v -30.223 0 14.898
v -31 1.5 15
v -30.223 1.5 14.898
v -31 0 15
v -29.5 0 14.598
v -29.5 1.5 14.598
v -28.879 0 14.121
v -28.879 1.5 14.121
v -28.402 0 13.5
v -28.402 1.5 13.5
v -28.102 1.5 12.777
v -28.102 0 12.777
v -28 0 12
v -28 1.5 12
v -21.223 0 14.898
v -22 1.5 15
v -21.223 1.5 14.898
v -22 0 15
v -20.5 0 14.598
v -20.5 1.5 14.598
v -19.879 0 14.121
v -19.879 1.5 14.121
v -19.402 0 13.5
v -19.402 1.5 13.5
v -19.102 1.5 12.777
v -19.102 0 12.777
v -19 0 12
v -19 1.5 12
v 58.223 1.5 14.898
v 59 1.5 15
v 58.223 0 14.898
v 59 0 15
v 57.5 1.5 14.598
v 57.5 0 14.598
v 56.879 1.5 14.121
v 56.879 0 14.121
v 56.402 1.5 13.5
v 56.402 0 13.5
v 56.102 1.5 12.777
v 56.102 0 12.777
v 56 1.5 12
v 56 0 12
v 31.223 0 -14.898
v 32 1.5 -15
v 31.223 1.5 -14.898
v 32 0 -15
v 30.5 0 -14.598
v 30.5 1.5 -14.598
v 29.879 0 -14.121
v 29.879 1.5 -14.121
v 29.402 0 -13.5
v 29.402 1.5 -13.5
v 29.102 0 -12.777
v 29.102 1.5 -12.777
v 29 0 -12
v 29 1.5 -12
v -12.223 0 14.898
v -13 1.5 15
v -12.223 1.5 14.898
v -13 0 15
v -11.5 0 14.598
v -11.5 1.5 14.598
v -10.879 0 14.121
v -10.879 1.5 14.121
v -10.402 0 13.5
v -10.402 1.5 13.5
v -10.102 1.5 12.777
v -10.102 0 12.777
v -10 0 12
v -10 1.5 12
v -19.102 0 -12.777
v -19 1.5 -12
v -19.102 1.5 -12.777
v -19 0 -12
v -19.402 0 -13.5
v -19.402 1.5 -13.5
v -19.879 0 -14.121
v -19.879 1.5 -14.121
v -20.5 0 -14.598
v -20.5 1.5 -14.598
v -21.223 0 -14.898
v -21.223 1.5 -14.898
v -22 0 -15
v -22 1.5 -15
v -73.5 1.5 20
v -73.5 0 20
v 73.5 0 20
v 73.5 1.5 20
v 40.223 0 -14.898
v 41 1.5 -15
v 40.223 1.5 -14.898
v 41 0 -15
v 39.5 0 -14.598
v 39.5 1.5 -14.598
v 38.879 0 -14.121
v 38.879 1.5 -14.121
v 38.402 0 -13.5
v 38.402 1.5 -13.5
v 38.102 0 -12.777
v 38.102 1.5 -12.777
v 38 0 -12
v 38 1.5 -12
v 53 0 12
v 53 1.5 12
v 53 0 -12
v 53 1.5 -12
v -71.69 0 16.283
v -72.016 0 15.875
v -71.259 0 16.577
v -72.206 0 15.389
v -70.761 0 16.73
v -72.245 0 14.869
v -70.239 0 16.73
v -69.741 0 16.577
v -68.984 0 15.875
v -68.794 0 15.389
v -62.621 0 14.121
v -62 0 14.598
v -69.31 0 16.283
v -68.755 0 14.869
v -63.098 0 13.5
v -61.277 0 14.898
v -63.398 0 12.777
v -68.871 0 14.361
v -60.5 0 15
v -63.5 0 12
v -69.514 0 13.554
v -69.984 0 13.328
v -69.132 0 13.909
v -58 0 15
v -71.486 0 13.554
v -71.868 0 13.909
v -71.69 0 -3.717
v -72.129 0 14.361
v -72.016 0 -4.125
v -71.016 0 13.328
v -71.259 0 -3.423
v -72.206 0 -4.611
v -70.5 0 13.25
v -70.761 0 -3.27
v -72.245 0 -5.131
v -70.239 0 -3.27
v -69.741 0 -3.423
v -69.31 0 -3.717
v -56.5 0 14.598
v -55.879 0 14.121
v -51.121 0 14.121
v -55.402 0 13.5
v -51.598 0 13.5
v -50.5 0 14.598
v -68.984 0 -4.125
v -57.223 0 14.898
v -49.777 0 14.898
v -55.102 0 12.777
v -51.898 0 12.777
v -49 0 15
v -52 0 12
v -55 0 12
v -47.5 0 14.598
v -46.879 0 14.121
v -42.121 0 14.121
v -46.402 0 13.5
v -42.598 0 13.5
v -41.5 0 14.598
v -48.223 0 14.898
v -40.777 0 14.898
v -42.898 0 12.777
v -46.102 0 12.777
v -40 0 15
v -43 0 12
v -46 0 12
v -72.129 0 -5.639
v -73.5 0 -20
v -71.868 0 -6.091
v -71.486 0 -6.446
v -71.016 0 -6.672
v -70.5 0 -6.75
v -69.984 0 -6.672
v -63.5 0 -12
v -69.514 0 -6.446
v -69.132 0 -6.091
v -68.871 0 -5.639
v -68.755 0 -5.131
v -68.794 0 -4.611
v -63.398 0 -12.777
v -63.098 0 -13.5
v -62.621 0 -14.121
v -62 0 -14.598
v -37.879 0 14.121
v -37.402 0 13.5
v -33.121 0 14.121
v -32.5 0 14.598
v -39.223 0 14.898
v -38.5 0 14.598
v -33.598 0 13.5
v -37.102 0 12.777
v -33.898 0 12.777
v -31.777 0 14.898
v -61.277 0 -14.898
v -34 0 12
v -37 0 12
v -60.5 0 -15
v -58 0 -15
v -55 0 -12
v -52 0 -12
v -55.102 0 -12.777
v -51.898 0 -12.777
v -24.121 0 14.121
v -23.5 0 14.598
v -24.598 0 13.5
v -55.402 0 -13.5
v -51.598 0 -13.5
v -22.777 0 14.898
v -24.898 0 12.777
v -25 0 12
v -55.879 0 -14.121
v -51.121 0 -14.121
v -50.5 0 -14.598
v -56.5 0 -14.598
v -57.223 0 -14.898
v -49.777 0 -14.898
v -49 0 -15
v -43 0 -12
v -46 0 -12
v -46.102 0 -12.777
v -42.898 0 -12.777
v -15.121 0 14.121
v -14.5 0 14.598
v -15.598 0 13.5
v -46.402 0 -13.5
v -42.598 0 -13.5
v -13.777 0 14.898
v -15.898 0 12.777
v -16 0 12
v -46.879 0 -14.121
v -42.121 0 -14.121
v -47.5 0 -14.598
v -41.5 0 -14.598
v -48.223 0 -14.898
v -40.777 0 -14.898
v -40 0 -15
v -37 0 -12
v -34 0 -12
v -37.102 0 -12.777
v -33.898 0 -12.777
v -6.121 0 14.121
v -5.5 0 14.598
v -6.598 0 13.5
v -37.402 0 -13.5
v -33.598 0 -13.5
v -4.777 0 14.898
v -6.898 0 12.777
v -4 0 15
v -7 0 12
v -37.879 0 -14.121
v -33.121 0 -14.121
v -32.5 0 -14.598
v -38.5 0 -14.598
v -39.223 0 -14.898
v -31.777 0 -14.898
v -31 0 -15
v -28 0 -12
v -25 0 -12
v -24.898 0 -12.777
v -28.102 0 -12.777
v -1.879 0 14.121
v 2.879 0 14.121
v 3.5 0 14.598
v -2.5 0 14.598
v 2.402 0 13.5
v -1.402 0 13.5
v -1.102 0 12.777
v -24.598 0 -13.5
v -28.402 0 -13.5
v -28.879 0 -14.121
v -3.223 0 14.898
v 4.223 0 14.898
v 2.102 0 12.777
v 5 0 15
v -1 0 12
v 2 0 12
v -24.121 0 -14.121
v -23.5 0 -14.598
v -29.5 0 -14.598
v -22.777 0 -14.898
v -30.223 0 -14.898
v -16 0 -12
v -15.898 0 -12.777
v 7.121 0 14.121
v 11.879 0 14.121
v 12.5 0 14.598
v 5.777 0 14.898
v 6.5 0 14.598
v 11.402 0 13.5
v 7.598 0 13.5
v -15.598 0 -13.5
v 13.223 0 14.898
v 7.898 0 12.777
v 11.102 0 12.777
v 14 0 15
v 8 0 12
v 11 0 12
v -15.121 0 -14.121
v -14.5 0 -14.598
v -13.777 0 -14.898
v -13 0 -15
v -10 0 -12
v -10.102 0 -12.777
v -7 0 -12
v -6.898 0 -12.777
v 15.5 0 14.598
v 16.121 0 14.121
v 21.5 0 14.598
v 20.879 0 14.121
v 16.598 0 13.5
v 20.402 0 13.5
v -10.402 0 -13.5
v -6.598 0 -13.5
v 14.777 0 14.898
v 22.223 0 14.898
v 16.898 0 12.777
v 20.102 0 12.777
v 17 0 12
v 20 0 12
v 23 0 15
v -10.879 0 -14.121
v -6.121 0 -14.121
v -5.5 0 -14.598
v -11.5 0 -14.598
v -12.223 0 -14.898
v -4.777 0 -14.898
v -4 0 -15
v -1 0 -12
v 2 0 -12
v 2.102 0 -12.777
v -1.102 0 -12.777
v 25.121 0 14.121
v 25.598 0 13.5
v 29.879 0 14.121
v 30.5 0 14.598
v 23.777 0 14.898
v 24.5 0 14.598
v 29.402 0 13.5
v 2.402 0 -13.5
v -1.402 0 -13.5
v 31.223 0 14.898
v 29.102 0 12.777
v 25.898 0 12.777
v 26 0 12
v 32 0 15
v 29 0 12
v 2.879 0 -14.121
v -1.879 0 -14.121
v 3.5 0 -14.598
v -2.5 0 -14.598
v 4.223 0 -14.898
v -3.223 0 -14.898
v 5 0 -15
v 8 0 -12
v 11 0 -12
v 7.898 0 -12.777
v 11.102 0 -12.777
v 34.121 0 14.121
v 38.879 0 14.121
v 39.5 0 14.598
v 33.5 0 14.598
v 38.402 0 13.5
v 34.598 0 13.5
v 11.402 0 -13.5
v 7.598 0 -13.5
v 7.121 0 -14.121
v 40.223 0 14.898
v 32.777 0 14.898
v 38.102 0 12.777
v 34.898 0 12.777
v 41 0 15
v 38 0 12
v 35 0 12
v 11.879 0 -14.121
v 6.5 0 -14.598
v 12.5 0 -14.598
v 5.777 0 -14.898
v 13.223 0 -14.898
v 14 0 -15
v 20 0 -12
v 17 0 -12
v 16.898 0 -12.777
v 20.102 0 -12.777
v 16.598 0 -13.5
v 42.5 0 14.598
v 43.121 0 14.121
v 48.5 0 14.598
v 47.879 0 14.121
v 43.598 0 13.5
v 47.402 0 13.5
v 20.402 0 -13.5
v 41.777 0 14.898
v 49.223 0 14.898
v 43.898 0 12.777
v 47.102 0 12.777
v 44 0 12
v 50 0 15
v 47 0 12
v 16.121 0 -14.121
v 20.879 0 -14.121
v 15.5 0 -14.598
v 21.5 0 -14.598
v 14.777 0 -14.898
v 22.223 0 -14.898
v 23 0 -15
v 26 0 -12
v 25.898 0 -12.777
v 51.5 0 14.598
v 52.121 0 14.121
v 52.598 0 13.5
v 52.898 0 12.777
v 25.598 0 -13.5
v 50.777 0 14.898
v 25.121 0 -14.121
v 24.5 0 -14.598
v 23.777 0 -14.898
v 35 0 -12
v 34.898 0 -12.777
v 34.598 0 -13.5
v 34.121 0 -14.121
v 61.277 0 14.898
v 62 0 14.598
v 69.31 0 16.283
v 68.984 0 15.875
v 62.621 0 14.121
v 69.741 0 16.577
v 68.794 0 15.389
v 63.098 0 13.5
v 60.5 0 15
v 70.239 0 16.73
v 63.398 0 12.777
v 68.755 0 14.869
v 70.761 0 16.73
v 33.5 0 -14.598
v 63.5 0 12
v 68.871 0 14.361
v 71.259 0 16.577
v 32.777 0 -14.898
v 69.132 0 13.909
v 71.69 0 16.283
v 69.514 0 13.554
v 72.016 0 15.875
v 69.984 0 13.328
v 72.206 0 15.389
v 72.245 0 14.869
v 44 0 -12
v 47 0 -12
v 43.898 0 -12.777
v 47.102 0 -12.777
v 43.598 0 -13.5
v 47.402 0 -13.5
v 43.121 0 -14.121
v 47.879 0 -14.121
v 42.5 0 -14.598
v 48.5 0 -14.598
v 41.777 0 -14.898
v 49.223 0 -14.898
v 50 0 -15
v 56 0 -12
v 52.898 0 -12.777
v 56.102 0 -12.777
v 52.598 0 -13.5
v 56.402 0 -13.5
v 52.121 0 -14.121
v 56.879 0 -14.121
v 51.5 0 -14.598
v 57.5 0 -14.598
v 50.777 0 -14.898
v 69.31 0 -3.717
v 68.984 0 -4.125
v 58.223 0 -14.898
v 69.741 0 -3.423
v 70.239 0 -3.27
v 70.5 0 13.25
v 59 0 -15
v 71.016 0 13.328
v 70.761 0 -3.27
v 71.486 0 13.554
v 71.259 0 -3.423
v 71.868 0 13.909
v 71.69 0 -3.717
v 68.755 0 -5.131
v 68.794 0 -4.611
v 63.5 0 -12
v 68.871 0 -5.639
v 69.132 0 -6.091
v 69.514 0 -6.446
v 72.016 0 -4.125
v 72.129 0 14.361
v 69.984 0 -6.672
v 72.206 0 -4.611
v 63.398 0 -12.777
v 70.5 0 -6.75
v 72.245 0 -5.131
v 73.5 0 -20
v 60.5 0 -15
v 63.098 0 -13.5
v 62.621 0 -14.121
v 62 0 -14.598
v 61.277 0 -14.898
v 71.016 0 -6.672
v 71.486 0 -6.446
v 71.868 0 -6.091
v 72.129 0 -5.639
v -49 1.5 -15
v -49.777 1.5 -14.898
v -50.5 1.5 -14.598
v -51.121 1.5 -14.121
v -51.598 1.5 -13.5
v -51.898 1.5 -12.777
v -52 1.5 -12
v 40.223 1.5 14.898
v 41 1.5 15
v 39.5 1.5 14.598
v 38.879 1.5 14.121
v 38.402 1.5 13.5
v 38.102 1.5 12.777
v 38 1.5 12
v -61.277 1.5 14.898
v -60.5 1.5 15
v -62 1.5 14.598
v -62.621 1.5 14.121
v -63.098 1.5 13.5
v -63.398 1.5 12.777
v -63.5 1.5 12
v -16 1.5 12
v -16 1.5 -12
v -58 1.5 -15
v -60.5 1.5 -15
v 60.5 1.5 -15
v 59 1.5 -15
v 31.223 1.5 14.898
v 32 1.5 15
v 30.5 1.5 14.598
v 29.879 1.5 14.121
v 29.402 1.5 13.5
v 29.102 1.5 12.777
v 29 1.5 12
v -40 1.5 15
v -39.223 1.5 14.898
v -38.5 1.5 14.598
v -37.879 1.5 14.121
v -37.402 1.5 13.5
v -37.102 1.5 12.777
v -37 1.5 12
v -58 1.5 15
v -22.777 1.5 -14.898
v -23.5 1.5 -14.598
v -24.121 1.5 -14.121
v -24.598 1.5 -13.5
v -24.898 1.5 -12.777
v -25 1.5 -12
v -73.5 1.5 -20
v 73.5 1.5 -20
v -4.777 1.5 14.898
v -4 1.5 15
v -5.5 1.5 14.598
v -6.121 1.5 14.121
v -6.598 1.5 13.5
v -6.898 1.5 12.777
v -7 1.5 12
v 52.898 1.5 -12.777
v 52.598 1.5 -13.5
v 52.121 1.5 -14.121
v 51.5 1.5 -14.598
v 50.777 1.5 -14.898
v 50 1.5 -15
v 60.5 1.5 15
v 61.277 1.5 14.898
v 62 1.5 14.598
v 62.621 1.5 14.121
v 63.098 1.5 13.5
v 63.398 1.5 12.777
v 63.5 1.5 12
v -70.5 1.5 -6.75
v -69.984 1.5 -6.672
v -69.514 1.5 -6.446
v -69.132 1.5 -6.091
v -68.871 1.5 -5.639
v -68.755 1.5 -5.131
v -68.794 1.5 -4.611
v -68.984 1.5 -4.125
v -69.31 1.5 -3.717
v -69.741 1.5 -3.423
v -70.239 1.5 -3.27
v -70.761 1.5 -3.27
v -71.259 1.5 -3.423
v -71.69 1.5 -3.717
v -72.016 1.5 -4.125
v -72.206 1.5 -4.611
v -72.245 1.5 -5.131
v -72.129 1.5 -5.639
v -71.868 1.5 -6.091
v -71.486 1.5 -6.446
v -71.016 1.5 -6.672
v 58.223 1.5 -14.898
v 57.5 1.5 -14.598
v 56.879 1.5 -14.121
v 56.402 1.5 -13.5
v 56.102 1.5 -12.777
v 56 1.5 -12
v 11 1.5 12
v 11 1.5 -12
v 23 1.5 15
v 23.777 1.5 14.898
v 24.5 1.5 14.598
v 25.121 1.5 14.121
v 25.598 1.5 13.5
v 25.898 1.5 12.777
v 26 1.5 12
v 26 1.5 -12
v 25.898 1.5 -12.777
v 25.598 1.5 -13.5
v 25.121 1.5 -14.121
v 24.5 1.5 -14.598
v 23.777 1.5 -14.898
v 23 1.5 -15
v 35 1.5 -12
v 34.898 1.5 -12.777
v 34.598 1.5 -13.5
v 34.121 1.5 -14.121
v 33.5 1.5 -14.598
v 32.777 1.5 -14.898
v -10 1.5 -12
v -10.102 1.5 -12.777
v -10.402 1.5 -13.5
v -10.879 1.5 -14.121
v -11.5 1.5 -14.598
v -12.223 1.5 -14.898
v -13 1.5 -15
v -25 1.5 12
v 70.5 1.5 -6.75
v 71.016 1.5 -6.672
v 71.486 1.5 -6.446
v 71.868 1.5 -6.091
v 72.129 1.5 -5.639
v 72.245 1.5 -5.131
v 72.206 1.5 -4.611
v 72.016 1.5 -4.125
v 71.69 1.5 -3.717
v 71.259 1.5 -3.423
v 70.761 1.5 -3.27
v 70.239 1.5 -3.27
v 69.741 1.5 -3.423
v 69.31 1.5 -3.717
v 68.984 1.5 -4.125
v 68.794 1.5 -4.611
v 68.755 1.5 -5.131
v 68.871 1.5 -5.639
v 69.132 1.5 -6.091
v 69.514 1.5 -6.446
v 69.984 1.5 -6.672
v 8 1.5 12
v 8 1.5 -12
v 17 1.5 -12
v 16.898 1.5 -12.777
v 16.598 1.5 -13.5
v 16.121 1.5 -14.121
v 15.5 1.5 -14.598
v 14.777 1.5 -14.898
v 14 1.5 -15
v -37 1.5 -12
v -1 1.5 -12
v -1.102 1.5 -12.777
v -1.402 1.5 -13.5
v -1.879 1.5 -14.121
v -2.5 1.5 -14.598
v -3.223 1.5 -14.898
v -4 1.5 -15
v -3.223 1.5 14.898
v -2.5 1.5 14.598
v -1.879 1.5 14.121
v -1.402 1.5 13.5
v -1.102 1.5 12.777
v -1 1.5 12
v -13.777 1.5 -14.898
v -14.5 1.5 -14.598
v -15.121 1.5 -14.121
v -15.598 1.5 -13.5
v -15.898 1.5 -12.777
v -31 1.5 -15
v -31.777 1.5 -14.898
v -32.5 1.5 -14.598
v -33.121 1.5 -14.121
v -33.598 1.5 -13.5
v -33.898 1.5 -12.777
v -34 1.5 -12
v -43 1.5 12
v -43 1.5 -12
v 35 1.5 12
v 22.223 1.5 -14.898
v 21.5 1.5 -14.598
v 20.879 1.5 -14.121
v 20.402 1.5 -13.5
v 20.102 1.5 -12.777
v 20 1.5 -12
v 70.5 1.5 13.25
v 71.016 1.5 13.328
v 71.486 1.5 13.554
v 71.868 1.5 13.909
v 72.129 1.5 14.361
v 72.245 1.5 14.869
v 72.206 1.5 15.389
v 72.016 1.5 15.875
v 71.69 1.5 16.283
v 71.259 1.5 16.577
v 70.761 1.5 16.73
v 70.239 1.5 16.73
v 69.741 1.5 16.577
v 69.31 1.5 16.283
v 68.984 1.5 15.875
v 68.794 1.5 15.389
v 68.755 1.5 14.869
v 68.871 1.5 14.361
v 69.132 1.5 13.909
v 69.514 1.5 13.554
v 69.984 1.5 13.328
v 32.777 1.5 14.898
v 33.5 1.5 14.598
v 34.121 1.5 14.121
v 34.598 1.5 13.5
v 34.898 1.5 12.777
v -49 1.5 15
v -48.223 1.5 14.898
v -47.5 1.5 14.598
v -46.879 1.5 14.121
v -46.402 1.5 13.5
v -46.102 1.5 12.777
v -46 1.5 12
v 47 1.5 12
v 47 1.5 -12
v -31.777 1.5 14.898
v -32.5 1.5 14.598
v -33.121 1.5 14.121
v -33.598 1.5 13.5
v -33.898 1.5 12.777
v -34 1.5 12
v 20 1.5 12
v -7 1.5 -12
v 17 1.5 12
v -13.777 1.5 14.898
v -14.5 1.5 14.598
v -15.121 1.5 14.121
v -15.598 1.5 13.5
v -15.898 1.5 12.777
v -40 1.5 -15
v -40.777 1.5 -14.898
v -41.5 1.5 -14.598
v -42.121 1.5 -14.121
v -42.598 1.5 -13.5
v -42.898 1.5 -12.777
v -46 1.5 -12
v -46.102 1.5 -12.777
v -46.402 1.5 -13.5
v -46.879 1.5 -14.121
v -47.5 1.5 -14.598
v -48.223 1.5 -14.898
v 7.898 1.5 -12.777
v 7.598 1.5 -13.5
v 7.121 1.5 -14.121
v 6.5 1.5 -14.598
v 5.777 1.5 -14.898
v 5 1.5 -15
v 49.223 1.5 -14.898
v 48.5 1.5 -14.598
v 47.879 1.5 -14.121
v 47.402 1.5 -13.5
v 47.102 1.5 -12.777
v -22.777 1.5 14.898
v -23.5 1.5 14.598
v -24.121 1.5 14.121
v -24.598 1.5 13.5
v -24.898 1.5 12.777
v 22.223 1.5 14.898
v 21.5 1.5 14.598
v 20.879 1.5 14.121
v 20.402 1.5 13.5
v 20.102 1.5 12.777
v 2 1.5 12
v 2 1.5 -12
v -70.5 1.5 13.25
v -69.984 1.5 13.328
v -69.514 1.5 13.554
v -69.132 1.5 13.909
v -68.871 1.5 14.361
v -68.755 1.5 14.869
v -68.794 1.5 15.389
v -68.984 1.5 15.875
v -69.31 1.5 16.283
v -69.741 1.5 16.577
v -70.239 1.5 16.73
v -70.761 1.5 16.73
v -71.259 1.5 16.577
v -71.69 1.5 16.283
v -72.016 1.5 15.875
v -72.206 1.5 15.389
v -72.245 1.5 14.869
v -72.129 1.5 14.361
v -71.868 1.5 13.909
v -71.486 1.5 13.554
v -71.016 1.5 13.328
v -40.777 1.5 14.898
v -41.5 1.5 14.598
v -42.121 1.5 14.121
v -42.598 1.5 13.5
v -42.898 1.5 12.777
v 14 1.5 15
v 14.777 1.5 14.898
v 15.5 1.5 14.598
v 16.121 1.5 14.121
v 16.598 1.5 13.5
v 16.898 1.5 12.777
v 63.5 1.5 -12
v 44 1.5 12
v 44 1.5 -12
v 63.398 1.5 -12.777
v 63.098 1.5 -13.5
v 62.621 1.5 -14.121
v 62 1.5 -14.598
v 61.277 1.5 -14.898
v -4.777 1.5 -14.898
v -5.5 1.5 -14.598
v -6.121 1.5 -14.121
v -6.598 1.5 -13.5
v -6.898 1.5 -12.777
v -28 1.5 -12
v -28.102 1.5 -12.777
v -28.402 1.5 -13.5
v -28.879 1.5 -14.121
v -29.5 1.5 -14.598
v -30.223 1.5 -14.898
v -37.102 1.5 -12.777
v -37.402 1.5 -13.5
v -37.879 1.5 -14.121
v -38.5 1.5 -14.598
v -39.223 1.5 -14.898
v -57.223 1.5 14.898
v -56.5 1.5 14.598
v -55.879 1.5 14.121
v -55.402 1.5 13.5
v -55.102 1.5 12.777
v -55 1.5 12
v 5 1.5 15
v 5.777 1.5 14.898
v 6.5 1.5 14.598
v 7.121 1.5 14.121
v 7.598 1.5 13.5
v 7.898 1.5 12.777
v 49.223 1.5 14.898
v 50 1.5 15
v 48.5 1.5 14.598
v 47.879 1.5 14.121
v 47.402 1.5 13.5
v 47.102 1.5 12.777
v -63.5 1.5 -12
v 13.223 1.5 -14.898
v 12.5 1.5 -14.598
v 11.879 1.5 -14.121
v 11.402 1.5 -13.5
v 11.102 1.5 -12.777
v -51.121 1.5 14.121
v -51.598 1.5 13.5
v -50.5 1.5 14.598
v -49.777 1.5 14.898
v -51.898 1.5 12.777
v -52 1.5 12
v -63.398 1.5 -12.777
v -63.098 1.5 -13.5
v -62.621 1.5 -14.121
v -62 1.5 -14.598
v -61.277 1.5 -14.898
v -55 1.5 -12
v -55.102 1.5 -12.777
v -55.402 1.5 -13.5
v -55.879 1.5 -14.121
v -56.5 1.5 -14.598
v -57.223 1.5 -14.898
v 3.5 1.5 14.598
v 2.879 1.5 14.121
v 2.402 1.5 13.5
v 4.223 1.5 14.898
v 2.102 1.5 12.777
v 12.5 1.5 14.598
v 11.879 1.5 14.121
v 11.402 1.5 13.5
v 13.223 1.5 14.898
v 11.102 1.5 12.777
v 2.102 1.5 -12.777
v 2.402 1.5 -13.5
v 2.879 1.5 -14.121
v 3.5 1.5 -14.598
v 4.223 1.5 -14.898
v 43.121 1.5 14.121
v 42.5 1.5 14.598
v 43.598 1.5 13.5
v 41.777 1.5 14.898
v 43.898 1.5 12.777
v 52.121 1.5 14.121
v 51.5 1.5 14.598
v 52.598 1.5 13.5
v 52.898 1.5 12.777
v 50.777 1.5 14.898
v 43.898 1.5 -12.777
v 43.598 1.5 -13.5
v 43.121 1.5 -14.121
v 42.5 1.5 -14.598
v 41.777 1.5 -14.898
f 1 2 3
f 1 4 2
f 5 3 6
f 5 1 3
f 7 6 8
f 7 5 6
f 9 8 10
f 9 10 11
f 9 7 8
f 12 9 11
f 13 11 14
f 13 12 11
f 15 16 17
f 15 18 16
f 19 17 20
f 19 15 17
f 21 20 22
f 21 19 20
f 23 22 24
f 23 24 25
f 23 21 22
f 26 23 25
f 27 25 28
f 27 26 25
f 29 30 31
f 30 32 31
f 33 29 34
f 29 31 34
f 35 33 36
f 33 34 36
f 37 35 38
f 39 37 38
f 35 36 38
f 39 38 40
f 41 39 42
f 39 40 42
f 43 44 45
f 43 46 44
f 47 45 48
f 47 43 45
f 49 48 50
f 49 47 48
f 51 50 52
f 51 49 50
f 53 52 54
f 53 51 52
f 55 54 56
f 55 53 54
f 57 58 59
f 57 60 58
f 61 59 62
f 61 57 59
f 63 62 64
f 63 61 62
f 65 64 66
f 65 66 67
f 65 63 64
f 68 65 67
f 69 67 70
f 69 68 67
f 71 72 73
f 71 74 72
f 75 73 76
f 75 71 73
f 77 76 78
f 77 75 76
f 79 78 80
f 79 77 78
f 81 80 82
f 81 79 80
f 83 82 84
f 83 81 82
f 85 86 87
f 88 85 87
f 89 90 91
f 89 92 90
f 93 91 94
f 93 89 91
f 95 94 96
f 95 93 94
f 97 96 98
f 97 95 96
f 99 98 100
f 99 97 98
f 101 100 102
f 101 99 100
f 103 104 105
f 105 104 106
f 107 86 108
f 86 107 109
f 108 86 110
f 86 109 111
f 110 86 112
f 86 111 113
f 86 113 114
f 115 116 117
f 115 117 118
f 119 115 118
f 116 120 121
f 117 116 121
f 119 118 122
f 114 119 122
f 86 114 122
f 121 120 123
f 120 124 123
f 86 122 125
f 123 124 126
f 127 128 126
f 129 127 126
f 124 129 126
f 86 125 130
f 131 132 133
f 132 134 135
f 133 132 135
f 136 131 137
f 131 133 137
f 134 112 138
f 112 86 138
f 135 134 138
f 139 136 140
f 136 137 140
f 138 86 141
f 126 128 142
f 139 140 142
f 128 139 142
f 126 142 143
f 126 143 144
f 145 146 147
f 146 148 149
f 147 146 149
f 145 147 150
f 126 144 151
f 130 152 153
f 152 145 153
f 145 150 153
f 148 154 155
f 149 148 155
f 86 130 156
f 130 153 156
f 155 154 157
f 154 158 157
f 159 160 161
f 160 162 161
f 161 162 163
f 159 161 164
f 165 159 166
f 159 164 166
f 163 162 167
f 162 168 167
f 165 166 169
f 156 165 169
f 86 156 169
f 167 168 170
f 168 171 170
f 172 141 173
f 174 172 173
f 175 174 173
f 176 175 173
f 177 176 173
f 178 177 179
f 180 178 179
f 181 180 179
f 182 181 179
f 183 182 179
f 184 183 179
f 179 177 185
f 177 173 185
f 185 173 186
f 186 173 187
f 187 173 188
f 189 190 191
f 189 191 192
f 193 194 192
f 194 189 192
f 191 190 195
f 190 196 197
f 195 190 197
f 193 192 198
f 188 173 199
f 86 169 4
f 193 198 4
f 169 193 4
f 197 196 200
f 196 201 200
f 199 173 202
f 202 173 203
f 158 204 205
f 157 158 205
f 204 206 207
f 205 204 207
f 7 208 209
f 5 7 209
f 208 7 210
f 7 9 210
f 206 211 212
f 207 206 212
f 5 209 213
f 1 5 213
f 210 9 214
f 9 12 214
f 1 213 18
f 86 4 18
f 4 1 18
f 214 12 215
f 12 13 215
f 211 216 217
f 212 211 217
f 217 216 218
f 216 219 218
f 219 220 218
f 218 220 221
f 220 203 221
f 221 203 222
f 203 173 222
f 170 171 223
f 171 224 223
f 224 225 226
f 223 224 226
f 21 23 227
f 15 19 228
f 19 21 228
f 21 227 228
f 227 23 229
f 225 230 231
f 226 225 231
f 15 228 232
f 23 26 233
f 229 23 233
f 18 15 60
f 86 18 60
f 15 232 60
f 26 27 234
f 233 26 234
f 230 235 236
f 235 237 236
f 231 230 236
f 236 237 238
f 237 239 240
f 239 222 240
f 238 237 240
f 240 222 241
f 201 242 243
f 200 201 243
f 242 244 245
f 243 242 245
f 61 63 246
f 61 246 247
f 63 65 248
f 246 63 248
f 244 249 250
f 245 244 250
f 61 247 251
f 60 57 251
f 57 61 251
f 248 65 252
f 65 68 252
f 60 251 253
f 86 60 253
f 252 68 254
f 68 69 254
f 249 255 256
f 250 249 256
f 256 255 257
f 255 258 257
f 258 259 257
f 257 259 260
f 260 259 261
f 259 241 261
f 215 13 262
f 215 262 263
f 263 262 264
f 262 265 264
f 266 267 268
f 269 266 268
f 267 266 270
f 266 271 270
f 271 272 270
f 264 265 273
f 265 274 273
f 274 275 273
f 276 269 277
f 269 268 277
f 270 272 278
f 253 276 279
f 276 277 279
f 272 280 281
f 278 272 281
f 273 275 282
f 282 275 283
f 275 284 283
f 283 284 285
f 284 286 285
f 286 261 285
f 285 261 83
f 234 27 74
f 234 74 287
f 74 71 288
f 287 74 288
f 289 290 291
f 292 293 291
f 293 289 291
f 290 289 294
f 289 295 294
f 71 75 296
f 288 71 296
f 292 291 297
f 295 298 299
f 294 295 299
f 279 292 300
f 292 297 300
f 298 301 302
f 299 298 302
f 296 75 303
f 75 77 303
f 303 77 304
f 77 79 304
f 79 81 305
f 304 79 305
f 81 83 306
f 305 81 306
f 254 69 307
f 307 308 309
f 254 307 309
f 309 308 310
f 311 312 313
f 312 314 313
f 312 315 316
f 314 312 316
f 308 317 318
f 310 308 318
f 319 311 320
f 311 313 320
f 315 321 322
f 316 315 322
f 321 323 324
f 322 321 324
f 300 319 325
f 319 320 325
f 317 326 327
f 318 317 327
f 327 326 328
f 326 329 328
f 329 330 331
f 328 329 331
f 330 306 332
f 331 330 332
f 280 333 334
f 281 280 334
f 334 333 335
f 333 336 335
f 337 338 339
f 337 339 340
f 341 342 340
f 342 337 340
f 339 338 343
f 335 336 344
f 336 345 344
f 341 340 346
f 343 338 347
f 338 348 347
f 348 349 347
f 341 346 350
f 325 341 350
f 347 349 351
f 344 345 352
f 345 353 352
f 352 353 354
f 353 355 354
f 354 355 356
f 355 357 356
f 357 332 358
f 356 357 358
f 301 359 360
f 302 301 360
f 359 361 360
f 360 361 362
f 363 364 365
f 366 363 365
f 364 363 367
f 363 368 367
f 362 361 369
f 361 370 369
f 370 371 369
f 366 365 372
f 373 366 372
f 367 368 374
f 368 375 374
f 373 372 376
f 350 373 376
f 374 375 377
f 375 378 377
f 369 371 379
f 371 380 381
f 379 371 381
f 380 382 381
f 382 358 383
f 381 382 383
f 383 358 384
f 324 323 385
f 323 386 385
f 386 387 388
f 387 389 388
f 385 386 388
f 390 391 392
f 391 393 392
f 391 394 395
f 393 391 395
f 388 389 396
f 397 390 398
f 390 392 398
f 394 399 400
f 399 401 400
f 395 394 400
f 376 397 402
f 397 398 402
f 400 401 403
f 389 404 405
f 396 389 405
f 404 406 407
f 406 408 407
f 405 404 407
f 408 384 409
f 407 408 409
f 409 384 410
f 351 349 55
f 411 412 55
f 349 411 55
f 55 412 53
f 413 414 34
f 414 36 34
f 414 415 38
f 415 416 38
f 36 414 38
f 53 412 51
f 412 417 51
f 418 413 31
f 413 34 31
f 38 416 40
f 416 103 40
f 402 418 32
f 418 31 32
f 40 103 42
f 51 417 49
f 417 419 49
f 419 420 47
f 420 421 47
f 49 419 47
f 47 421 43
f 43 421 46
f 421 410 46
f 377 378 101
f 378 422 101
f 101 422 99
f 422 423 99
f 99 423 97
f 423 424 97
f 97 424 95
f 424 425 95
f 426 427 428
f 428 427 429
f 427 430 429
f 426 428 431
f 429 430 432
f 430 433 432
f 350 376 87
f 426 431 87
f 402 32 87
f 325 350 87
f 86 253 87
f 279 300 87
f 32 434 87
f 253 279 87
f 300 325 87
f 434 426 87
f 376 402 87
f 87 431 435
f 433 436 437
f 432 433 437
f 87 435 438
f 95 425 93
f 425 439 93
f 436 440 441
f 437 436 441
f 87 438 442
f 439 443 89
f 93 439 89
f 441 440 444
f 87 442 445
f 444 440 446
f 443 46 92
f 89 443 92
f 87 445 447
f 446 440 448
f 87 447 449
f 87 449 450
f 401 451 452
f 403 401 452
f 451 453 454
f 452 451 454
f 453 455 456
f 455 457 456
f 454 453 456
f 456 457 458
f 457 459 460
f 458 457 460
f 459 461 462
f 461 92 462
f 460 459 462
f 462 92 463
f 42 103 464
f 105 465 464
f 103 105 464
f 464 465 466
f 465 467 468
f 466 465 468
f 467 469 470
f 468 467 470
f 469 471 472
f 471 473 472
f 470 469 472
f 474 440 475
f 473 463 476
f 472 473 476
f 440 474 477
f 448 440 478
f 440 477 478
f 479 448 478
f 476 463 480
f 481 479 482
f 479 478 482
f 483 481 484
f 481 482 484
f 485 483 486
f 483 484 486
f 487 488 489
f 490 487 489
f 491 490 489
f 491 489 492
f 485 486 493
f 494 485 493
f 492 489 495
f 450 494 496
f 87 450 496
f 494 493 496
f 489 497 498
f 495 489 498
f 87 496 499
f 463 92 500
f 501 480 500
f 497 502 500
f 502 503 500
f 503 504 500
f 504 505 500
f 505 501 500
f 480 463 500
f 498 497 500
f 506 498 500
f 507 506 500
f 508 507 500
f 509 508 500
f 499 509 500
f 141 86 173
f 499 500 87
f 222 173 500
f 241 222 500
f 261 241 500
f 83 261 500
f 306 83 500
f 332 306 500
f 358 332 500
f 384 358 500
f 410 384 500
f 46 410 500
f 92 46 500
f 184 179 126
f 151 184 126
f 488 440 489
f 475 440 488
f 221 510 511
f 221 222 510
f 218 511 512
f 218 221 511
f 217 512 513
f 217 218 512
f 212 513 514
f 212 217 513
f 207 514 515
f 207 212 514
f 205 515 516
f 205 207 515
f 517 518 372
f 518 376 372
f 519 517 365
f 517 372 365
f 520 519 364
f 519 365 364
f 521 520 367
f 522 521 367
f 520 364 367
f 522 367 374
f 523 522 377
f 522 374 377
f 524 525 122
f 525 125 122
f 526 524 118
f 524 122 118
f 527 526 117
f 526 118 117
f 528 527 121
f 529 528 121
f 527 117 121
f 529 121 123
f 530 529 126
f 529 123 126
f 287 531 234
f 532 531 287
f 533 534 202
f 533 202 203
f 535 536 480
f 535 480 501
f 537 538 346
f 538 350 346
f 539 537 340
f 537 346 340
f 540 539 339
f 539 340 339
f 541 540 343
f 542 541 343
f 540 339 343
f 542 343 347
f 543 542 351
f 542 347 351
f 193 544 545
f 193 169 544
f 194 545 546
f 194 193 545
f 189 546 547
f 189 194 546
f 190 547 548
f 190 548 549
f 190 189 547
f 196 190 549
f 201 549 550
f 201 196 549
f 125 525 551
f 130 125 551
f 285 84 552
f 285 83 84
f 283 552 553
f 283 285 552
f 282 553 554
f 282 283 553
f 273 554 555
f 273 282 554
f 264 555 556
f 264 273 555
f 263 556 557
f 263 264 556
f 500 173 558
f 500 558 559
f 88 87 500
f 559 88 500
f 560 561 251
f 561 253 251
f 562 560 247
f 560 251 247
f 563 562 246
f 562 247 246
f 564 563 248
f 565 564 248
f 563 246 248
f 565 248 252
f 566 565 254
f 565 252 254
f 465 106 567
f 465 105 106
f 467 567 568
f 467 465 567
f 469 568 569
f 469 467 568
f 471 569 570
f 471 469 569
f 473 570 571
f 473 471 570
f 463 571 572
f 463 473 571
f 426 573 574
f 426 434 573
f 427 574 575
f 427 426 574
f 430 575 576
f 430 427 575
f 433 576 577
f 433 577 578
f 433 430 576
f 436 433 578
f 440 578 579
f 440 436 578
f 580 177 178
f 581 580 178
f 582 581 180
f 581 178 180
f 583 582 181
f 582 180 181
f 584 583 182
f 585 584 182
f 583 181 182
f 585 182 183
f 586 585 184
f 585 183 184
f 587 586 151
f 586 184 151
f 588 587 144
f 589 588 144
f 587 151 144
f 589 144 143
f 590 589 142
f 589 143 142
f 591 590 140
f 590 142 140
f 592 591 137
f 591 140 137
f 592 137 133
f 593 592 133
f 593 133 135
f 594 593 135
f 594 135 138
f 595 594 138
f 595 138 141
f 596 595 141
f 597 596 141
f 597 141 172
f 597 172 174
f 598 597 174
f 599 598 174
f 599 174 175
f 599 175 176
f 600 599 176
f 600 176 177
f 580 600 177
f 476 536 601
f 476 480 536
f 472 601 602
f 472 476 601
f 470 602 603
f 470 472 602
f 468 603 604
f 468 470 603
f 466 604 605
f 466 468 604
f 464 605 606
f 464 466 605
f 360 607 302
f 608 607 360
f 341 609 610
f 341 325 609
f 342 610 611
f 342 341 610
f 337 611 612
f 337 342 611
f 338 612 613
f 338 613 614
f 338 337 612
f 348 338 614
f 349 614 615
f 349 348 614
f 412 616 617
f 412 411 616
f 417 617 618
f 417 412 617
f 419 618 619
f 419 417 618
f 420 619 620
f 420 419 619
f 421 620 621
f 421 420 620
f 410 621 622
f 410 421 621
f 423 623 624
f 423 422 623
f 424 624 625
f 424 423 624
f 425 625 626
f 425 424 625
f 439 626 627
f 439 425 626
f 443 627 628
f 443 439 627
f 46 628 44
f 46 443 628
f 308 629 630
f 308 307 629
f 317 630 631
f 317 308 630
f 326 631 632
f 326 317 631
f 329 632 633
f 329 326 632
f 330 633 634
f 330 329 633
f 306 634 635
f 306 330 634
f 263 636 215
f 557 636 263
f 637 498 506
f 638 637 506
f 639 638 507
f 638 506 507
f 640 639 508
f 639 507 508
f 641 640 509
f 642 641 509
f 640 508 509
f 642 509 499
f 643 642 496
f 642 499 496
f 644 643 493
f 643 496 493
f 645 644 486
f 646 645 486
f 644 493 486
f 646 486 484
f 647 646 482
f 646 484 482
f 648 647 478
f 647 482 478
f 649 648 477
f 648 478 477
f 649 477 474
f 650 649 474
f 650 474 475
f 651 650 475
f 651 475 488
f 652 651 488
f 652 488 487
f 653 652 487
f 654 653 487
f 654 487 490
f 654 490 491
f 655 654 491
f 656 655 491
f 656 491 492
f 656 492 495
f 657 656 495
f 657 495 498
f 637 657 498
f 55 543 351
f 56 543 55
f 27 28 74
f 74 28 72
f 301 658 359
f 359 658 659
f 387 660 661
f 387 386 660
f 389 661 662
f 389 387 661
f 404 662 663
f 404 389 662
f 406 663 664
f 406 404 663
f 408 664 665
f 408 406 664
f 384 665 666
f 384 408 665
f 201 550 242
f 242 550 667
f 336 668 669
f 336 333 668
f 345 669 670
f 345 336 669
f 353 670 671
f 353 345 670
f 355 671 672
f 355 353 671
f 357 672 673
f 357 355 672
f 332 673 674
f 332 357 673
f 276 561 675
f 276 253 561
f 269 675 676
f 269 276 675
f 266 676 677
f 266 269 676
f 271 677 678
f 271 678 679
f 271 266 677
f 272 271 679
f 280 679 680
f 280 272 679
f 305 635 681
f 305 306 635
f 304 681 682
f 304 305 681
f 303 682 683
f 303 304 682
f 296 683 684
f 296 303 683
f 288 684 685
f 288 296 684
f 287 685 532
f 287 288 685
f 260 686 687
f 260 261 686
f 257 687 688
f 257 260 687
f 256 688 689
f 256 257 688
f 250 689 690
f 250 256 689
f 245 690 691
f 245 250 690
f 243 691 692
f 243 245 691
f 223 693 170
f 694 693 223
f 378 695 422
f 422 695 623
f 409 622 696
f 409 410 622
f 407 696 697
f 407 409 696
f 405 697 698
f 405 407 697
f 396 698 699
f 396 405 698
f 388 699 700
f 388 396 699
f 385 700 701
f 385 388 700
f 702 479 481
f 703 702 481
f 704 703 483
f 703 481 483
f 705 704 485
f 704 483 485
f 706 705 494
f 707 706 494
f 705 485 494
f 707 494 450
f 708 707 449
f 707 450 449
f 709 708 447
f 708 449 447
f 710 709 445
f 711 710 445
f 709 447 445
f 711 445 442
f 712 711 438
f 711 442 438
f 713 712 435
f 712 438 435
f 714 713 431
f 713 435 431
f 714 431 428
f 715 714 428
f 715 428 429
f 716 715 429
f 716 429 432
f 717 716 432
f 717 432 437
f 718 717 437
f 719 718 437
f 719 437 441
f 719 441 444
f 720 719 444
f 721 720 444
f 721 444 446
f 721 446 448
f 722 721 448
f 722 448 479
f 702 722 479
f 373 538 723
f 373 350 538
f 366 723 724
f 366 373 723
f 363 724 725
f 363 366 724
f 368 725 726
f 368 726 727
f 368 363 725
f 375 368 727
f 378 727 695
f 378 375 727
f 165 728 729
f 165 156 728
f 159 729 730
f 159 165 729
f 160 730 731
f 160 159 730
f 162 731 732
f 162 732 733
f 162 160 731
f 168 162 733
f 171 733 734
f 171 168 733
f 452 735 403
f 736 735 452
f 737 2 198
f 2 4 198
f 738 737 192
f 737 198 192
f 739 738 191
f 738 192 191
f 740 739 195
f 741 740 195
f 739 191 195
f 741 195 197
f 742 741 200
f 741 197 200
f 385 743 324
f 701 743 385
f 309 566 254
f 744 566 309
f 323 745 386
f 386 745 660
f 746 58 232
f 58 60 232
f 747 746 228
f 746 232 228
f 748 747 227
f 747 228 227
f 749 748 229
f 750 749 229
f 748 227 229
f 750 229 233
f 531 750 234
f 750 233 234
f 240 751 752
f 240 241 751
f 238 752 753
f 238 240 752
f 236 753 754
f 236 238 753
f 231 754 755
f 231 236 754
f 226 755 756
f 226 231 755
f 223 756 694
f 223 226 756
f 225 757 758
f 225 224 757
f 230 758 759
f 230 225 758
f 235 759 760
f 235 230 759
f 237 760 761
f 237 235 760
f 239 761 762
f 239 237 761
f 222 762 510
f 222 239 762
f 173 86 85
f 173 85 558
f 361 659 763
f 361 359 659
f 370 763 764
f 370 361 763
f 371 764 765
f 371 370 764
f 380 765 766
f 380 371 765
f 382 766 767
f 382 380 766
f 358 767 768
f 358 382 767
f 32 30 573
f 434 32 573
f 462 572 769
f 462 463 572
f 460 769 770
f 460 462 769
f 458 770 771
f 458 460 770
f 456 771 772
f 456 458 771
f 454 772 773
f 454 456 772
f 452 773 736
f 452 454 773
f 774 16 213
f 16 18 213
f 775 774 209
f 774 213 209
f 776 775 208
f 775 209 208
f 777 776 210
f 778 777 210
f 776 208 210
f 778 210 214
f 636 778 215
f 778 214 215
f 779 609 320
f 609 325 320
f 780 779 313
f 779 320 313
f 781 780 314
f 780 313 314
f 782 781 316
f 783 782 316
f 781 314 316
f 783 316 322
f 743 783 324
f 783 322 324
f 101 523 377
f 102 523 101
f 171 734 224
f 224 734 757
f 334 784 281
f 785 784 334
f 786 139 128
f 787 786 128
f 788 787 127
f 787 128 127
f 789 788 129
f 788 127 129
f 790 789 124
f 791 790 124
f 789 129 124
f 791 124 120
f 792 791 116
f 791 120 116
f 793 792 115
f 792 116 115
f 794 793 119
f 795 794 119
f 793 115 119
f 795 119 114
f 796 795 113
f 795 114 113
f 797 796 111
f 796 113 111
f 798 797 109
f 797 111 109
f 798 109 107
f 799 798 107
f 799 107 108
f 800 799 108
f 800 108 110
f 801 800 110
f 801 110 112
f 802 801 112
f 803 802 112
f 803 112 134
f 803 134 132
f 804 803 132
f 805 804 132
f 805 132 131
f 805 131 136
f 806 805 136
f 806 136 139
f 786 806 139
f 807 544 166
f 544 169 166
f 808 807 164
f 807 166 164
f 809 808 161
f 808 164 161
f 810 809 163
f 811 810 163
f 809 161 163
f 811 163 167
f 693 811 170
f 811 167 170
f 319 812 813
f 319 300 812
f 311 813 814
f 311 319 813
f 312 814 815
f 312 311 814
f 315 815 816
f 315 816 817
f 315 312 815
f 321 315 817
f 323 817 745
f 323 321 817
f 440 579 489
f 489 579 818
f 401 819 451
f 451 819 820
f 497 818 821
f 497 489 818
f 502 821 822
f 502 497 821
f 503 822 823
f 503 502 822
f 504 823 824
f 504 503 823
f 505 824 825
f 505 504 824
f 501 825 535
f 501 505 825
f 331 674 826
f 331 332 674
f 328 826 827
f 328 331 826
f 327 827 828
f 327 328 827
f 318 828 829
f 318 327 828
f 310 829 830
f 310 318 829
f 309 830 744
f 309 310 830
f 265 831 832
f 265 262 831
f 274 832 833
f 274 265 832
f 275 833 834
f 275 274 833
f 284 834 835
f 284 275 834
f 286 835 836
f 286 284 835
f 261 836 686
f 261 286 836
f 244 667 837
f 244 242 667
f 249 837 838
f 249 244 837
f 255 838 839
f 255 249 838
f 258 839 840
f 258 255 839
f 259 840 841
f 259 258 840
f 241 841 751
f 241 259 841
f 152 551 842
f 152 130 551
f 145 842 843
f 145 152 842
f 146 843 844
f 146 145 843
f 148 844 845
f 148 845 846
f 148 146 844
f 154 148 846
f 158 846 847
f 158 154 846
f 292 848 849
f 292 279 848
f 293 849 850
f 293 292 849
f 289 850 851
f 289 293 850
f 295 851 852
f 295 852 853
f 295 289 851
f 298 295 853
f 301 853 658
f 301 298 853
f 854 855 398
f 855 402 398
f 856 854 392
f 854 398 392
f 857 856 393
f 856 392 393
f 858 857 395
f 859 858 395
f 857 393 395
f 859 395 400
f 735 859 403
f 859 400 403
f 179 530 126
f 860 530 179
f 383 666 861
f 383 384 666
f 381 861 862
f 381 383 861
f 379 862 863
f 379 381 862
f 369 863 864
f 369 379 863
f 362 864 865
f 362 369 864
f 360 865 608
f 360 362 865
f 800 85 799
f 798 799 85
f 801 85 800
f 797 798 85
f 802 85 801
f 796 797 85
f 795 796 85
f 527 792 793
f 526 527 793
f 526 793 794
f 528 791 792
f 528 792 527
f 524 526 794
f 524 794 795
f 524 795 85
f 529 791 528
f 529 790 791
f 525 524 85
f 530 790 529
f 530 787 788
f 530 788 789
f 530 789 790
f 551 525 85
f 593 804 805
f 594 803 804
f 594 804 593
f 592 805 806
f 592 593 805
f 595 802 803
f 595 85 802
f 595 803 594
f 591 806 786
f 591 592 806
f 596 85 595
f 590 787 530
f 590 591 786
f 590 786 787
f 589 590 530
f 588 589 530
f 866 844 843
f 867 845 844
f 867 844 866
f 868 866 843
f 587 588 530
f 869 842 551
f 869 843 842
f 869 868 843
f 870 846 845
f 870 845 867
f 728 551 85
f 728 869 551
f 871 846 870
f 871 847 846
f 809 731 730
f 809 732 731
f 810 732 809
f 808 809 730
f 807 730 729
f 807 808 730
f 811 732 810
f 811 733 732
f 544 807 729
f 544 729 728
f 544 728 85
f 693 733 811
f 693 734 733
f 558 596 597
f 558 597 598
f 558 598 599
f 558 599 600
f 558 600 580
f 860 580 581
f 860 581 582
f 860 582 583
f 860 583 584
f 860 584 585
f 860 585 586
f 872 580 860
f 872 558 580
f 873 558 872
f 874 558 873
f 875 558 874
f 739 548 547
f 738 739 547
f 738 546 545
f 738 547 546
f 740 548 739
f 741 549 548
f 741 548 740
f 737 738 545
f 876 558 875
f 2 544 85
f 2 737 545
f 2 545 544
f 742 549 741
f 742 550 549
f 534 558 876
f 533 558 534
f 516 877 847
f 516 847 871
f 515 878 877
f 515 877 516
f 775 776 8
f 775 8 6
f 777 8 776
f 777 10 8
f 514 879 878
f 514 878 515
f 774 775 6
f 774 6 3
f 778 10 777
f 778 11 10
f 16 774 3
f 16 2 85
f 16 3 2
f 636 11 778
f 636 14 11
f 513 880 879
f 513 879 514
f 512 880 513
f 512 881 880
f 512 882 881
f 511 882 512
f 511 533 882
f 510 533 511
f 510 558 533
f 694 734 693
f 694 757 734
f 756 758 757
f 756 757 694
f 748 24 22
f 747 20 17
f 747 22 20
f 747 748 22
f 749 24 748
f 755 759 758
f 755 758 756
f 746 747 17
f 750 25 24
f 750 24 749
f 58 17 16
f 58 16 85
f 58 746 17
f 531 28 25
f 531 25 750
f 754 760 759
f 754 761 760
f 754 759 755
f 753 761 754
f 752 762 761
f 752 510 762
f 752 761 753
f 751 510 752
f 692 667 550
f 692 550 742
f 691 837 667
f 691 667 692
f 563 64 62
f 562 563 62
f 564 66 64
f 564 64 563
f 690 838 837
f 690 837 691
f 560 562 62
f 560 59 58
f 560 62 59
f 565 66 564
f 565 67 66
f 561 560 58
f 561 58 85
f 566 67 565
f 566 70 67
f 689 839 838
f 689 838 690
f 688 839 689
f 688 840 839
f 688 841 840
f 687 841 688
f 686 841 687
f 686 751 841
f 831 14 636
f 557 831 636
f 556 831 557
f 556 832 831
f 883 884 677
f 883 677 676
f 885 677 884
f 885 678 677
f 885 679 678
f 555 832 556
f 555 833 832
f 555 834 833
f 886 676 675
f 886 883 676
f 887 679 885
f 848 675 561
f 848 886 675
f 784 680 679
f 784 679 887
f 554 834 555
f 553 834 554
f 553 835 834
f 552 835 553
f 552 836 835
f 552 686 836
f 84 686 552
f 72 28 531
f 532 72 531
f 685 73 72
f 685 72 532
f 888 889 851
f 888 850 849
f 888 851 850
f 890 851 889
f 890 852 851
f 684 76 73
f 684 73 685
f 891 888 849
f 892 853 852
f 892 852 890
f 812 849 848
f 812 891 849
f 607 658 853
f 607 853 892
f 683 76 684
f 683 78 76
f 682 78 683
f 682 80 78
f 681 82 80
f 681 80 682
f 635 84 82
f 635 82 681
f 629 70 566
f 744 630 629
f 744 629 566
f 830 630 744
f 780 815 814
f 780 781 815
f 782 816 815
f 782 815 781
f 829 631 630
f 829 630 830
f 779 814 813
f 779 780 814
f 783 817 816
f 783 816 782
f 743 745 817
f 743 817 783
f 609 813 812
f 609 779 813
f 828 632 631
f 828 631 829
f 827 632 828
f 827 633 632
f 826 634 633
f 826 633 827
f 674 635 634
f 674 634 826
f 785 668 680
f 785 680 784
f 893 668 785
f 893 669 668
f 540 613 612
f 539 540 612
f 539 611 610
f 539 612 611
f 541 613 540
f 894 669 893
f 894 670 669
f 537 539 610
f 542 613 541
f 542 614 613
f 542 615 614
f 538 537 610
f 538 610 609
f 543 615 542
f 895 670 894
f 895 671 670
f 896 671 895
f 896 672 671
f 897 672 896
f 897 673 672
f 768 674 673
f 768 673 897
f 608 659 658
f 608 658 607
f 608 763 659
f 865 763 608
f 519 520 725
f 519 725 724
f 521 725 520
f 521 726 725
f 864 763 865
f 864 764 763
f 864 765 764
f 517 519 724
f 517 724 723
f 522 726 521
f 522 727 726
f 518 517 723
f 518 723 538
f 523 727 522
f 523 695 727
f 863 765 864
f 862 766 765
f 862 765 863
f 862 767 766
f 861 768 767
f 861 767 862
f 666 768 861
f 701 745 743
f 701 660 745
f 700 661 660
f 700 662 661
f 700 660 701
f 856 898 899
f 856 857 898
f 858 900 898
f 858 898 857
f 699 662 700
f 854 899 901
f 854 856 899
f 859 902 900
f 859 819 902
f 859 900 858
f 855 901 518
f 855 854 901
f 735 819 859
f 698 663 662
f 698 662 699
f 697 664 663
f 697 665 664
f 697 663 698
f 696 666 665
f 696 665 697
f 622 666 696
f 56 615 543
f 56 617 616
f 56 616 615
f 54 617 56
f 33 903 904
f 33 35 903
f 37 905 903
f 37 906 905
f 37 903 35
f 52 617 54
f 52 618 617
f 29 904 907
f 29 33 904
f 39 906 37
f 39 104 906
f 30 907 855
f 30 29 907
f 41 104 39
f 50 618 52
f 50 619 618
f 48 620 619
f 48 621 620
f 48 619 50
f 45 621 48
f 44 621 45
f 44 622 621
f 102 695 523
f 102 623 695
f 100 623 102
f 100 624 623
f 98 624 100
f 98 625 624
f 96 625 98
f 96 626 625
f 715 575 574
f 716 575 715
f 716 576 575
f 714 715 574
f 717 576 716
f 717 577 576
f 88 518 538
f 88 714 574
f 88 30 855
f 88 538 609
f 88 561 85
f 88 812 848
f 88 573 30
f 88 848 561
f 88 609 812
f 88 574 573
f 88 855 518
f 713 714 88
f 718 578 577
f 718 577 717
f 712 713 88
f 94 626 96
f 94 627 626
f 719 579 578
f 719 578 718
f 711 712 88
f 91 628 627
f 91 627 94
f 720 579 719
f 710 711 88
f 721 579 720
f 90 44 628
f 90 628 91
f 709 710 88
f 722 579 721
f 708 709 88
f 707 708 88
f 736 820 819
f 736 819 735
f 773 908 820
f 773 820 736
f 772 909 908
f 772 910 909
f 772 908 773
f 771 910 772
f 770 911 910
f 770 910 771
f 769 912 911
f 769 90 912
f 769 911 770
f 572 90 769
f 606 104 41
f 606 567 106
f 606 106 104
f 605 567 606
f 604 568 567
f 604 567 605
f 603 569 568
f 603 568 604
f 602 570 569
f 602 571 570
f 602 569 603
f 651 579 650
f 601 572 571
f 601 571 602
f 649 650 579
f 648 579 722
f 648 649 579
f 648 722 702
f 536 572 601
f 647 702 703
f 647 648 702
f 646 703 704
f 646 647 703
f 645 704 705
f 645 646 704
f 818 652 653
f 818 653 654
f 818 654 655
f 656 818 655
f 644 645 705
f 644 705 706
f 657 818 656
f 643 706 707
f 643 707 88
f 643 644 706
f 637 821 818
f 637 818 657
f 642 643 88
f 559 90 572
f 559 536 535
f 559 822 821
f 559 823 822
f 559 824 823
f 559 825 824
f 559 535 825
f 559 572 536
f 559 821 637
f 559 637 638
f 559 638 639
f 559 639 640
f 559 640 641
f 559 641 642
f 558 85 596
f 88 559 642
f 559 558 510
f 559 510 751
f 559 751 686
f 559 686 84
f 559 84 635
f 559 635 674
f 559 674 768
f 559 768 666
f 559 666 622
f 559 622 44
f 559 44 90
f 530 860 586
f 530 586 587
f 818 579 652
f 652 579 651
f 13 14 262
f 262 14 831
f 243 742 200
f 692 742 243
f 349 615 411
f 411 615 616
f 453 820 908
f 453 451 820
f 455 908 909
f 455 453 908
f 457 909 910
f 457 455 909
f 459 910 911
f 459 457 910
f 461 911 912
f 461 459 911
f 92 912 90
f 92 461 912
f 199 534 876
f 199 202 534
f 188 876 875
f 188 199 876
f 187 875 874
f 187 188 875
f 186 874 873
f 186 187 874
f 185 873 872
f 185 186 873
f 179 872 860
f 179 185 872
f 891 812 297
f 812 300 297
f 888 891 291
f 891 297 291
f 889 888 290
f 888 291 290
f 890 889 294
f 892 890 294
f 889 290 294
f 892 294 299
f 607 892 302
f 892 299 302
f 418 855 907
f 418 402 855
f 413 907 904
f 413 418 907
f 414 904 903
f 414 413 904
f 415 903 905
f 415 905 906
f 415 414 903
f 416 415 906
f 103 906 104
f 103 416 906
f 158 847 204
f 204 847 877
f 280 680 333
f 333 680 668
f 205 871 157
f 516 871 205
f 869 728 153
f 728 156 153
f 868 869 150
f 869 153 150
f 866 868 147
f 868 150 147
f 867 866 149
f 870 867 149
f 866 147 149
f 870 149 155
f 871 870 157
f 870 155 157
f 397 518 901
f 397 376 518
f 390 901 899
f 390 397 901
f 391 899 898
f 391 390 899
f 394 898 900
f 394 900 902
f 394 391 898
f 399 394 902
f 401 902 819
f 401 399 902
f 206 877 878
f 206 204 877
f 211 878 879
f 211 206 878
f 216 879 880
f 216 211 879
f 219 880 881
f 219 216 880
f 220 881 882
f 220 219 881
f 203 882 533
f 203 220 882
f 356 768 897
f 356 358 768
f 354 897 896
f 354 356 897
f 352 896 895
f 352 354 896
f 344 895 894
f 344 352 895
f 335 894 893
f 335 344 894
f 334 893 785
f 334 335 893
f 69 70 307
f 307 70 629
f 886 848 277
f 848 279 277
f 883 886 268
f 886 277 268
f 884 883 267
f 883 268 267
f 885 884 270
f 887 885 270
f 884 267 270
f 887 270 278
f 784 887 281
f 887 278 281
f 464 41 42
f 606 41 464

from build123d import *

# Parameters (mm, degrees)
SKETCH_2_W          = 147
SKETCH_2_H          = 40
EXTRUDE_1_DEPTH     = 1.5
SKETCH_3_R          = 1.75
CUT_EXTRUDE_1_DEPTH = 10
SKETCH_4_W          = 8.5
SKETCH_4_H          = 30
SKETCH_4_W_2        = 6
SKETCH_4_W_3        = 7.5
CUT_EXTRUDE_2_DEPTH = 10
FILLET_1_R          = 3


with BuildPart() as part:
    # 草图2 → 凸台-拉伸1 (new body)
    with BuildSketch(Plane(origin=(0, 0, 0), x_dir=(1, 0, 0), z_dir=(0, 1, 0))):
        Rectangle(SKETCH_2_W, SKETCH_2_H)
    extrude(amount=EXTRUDE_1_DEPTH)

    # 草图3 → 切除-拉伸1 (cut)
    with BuildSketch(Plane.XZ):
        with Locations(Location((70.5, 15, 0), (0, 0, 270))):
            Circle(SKETCH_3_R)
        with Locations(Location((70.5, -5, 0), (0, 0, 270))):
            Circle(SKETCH_3_R)
        with Locations(Location((-70.5, 15, 0), (0, 0, 270))):
            Circle(SKETCH_3_R)
        with Locations(Location((-70.5, -5, 0), (0, 0, 270))):
            Circle(SKETCH_3_R)
    extrude(amount=-CUT_EXTRUDE_1_DEPTH, mode=Mode.SUBTRACT)

    # 草图4 → 切除-拉伸2 (cut)
    with BuildSketch(Plane(origin=(0, 1.5, 0), x_dir=(1, 0, 0), z_dir=(0, 1, 0))):
        with Locations((-59.25, 0)):
            Rectangle(SKETCH_4_W, SKETCH_4_H)
        with Locations((-49, 0)):
            Rectangle(SKETCH_4_W_2, SKETCH_4_H)
        with Locations((-40, 0)):
            Rectangle(SKETCH_4_W_2, SKETCH_4_H)
        with Locations((-31, 0)):
            Rectangle(SKETCH_4_W_2, SKETCH_4_H)
        with Locations((-22, 0)):
            Rectangle(SKETCH_4_W_2, SKETCH_4_H)
        with Locations((-13, 0)):
            Rectangle(SKETCH_4_W_2, SKETCH_4_H)
        with Locations((-4, 0)):
            Rectangle(SKETCH_4_W_2, SKETCH_4_H)
        with Locations((5, 0)):
            Rectangle(SKETCH_4_W_2, SKETCH_4_H)
        with Locations((14, 0)):
            Rectangle(SKETCH_4_W_2, SKETCH_4_H)
        with Locations((23, 0)):
            Rectangle(SKETCH_4_W_2, SKETCH_4_H)
        with Locations((32, 0)):
            Rectangle(SKETCH_4_W_2, SKETCH_4_H)
        with Locations((41, 0)):
            Rectangle(SKETCH_4_W_2, SKETCH_4_H)
        with Locations((50, 0)):
            Rectangle(SKETCH_4_W_2, SKETCH_4_H)
        with Locations((59.75, 0)):
            Rectangle(SKETCH_4_W_3, SKETCH_4_H)
    extrude(amount=-CUT_EXTRUDE_2_DEPTH, mode=Mode.SUBTRACT)

    # 圆角1
    fillet_1_edges = [part.edges().sort_by_distance(p)[0] for p in [
        (-52, 0.75, -15),
        (-46, 0.75, -15),
        (-37, 0.75, 15),
        (-43, 0.75, 15),
        (-43, 0.75, -15),
        (-37, 0.75, -15),
        (-28, 0.75, 15),
        (-34, 0.75, 15),
        (-34, 0.75, -15),
        (-28, 0.75, -15),
        (-19, 0.75, 15),
        (-25, 0.75, 15),
        (-25, 0.75, -15),
        (-19, 0.75, -15),
        (-10, 0.75, 15),
        (-16, 0.75, 15),
        (-16, 0.75, -15),
        (-10, 0.75, -15),
        (-1, 0.75, 15),
        (-7, 0.75, 15),
        (-7, 0.75, -15),
        (-1, 0.75, -15),
        (8, 0.75, 15),
        (2, 0.75, 15),
        (2, 0.75, -15),
        (8, 0.75, -15),
        (17, 0.75, 15),
        (11, 0.75, 15),
        (11, 0.75, -15),
        (17, 0.75, -15),
        (26, 0.75, 15),
        (20, 0.75, 15),
        (20, 0.75, -15),
        (26, 0.75, -15),
        (35, 0.75, 15),
        (29, 0.75, 15),
        (29, 0.75, -15),
        (35, 0.75, -15),
        (44, 0.75, 15),
        (38, 0.75, 15),
        (38, 0.75, -15),
        (44, 0.75, -15),
        (53, 0.75, 15),
        (47, 0.75, 15),
        (47, 0.75, -15),
        (53, 0.75, -15),
        (56, 0.75, 15),
        (56, 0.75, -15),
        (63.5, 0.75, -15),
        (63.5, 0.75, 15),
        (-55, 0.75, 15),
        (-63.5, 0.75, 15),
        (-63.5, 0.75, -15),
        (-55, 0.75, -15),
        (-46, 0.75, 15),
        (-52, 0.75, 15),
    ]]
    fillet(fillet_1_edges, radius=FILLET_1_R - 0.0001)  # a hair under: the kernel refuses the full size


solid = part.part
